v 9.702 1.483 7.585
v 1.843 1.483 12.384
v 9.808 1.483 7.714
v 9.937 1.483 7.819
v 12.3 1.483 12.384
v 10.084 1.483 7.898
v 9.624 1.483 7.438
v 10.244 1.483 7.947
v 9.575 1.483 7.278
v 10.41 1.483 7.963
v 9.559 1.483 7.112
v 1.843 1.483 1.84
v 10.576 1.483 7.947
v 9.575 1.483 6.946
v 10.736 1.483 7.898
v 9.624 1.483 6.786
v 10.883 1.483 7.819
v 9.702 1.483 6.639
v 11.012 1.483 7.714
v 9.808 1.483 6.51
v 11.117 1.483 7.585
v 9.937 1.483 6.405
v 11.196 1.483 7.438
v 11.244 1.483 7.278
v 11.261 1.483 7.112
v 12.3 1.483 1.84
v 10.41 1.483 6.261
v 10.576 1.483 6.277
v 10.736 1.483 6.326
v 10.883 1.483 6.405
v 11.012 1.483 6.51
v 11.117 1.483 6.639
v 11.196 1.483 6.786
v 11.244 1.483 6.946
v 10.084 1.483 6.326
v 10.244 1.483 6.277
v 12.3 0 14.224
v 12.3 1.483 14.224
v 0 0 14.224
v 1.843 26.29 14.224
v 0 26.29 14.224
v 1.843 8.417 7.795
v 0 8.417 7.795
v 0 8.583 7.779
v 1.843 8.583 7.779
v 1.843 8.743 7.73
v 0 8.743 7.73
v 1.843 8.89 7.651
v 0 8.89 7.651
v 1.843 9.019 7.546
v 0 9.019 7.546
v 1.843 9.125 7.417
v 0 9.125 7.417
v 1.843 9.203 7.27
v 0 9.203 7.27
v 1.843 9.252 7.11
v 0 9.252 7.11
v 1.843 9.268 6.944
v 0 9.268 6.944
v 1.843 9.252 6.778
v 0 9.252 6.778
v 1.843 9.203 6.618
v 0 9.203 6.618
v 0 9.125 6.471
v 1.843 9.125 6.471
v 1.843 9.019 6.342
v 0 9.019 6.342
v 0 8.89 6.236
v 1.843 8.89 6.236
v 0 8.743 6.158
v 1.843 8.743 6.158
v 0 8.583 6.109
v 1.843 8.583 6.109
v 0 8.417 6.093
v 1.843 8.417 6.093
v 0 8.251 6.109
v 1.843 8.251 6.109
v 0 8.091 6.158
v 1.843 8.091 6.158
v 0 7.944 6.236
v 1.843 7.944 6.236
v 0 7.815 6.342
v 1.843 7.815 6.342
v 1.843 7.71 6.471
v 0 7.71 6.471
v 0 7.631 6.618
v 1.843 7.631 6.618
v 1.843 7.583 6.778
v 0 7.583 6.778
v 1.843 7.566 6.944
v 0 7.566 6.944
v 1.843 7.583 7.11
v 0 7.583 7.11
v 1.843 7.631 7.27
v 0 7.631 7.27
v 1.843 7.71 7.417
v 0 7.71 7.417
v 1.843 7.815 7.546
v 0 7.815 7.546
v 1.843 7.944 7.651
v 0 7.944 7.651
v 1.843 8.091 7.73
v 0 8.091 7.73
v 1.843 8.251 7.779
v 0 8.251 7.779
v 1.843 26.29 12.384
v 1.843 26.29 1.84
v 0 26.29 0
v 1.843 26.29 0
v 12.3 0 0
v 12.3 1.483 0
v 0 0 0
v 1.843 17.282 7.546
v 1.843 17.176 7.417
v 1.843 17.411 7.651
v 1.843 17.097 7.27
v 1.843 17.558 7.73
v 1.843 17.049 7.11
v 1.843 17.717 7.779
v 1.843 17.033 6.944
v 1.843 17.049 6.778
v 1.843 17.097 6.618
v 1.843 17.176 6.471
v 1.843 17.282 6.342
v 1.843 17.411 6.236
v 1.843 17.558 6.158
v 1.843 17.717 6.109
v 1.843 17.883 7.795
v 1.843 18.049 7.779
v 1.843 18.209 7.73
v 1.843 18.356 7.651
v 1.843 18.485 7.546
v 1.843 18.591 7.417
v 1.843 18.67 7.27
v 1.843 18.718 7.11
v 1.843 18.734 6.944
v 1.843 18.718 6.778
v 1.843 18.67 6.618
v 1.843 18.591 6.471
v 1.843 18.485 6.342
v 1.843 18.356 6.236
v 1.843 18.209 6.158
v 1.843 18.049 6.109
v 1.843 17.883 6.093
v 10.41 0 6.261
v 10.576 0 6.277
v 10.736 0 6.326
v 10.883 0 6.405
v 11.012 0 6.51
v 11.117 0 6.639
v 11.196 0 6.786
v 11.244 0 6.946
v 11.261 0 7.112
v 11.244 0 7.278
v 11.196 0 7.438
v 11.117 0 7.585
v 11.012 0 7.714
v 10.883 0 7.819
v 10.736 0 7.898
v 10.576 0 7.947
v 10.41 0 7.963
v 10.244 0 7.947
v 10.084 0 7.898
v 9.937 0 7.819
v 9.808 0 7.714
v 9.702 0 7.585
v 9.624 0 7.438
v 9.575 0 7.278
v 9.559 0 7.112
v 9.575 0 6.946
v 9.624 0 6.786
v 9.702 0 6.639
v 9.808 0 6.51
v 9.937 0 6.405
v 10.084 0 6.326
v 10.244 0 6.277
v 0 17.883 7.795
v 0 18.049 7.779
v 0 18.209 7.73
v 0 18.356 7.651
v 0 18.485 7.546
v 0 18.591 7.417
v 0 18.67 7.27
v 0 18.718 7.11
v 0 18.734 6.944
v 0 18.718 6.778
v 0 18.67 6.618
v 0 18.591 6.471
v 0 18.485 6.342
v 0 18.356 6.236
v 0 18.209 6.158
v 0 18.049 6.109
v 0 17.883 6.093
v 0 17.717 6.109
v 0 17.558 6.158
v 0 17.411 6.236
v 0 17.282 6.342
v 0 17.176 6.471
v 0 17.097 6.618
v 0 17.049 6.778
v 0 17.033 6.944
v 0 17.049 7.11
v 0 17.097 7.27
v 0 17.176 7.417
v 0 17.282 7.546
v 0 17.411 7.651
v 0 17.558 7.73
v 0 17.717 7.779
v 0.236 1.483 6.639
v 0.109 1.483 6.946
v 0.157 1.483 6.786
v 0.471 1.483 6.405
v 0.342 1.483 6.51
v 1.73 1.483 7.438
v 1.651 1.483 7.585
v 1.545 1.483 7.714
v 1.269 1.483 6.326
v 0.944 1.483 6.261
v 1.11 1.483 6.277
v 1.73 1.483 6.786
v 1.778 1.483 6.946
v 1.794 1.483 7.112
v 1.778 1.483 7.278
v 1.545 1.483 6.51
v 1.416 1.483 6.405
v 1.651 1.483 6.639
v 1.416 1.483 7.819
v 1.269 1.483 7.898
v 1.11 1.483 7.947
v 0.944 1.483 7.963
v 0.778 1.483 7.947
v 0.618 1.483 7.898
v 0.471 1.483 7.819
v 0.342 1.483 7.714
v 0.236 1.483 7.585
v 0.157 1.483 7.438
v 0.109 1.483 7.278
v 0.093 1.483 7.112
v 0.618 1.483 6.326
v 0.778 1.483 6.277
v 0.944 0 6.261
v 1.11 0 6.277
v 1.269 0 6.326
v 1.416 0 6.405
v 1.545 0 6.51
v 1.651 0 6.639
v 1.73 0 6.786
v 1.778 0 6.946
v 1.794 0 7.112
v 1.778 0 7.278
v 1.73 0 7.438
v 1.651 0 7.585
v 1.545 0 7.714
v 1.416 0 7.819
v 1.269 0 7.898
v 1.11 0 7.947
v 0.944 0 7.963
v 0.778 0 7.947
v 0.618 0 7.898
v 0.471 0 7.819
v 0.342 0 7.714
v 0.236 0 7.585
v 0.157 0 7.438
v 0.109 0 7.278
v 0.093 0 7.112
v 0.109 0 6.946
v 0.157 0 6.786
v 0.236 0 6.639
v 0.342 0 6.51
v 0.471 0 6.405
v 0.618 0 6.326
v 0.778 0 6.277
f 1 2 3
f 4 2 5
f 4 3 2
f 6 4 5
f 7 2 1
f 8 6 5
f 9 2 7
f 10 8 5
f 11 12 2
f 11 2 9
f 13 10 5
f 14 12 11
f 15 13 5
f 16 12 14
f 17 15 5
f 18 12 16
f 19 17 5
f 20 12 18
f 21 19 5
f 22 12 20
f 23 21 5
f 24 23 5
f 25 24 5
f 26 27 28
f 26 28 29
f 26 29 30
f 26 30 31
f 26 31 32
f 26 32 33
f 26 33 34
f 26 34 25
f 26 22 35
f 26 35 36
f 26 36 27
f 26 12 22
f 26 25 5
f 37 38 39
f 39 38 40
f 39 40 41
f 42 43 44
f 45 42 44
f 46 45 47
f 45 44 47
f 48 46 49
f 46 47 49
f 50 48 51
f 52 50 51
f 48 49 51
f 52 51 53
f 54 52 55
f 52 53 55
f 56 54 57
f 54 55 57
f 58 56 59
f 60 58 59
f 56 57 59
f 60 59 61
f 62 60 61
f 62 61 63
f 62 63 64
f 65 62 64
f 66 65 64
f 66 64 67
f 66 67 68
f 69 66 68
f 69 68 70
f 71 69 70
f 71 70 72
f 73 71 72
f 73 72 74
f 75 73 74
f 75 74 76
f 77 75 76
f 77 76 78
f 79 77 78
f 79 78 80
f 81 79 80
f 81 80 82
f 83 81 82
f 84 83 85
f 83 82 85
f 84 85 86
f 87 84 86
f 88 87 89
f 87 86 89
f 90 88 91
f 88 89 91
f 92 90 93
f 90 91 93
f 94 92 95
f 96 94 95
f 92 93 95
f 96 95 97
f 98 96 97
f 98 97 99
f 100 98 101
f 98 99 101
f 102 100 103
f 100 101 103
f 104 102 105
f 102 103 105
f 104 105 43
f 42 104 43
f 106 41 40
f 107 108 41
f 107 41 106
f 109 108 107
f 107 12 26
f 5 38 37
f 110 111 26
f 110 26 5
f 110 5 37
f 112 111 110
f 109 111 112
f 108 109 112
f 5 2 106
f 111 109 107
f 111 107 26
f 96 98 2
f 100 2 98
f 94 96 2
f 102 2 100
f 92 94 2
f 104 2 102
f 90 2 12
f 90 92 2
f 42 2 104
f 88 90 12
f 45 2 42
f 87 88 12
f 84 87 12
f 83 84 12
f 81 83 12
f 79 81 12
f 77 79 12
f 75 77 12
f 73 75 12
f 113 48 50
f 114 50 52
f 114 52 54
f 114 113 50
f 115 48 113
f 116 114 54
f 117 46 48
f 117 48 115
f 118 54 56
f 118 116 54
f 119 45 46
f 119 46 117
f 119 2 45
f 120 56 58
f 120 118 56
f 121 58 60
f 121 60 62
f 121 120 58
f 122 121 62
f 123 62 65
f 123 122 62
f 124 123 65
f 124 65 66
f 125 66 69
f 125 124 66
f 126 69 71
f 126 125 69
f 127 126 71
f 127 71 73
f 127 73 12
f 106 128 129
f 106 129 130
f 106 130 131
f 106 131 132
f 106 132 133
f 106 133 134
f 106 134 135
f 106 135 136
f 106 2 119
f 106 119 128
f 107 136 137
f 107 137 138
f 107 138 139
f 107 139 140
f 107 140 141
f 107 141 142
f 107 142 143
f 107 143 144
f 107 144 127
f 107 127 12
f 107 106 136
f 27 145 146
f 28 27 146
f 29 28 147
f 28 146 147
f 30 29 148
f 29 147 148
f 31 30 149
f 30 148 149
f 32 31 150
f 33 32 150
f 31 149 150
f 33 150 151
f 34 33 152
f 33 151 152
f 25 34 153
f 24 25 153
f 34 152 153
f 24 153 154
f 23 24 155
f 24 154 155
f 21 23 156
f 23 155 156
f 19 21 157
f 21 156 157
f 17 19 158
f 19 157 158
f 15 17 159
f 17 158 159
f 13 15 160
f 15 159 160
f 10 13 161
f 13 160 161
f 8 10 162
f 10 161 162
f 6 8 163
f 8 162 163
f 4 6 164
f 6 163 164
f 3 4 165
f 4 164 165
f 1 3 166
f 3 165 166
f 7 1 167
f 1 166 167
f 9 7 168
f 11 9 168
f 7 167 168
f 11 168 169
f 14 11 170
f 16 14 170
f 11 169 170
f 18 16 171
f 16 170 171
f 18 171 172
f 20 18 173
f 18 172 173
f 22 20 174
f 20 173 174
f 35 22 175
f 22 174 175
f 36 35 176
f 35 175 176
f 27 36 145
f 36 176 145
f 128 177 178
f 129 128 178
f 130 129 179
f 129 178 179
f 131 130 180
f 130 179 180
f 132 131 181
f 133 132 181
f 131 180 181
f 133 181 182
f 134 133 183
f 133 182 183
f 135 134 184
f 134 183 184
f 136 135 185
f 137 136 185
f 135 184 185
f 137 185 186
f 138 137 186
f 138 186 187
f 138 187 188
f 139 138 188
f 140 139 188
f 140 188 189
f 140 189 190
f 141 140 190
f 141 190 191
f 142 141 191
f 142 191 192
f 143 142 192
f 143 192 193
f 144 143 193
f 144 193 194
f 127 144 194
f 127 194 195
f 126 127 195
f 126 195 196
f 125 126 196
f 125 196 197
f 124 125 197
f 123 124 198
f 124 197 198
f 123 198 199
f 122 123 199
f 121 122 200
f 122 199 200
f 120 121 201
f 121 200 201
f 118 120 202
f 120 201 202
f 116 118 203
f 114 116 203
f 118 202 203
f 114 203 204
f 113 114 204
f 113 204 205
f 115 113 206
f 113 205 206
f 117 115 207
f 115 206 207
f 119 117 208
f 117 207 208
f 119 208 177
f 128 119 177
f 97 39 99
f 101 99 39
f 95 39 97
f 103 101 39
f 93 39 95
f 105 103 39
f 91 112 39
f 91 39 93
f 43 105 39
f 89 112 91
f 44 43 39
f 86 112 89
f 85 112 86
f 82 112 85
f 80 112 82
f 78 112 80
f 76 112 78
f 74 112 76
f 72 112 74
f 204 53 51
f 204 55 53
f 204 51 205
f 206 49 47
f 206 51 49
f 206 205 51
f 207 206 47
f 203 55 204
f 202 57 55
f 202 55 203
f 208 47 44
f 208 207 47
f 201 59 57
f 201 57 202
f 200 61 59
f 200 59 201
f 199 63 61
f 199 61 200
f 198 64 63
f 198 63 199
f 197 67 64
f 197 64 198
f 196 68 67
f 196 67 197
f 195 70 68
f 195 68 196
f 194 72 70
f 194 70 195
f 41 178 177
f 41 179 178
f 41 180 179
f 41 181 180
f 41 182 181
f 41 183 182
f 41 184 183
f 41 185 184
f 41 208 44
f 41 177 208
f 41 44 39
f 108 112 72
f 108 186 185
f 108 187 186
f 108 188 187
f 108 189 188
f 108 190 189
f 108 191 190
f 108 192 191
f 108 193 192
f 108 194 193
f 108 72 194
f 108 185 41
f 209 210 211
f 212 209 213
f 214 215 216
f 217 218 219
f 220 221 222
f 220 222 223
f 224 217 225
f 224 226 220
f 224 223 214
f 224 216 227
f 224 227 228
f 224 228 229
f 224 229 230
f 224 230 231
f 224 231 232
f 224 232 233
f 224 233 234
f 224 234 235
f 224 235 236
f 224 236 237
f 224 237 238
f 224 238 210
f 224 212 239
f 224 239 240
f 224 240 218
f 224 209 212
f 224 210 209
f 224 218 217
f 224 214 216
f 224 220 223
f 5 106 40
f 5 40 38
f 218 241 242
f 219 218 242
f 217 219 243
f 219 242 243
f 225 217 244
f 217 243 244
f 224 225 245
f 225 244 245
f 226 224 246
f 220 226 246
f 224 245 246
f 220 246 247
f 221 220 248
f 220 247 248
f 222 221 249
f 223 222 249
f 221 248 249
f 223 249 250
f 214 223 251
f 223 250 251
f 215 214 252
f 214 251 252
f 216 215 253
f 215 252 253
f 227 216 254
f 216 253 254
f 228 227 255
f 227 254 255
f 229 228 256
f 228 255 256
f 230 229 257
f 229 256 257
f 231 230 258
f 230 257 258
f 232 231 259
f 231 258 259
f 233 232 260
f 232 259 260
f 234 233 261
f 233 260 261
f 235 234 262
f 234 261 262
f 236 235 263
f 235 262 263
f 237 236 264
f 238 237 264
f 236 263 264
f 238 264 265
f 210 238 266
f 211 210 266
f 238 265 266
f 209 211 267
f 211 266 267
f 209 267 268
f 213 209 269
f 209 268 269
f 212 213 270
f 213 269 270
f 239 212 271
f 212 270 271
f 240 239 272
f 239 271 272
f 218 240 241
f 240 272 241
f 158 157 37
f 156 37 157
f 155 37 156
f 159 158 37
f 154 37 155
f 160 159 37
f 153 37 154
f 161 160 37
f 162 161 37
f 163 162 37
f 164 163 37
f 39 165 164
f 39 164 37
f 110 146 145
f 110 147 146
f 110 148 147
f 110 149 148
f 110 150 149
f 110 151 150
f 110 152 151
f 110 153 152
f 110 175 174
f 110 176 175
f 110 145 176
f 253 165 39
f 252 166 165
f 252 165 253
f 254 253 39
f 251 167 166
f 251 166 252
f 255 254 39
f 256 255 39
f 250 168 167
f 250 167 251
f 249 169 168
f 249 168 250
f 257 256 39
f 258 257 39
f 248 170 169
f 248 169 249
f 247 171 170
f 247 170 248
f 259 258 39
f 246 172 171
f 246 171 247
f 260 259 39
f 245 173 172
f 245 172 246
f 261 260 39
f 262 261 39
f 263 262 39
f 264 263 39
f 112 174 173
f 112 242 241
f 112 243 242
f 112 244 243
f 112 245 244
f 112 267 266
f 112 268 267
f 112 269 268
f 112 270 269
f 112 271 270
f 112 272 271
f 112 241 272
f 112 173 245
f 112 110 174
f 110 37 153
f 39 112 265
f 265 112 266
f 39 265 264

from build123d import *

# Parameters (mm, degrees)
BOSS_EXTRUDE1_DEPTH = 14.224
SKETCH2_W           = 10.456669683
SKETCH2_H           = 10.544
CUT_EXTRUDE1_DEPTH  = 24.807321
SKETCH3_R           = 0.8509
CUT_EXTRUDE2_DEPTH  = 10
SKETCH4_R           = 0.8509
CUT_EXTRUDE3_DEPTH  = 1.482678733


with BuildPart() as part:
    # Sketch1 → Boss-Extrude1 (new body)
    with BuildSketch(Plane.XY):
        Polygon((1.843330317, 26.29), (12.3, 1.482678733), (12.3, 0), (0, 0), (0, 26.29), align=None)
    extrude(amount=BOSS_EXTRUDE1_DEPTH)

    # Sketch2 → Cut-Extrude1 (cut)
    with BuildSketch(Plane(origin=(0, 26.29, 0), x_dir=(1, 0, 0), z_dir=(0, 1, 0))):
        with Locations((7.071665159, -7.112)):
            Rectangle(SKETCH2_W, SKETCH2_H)
    extrude(amount=-CUT_EXTRUDE1_DEPTH, mode=Mode.SUBTRACT)

    # Sketch3 → Cut-Extrude2 (cut)
    with BuildSketch(Plane.ZY):
        with Locations((6.943990858, 17.883471262)):
            Circle(SKETCH3_R)
        with Locations((6.943990858, 8.417089843)):
            Circle(SKETCH3_R)
    extrude(amount=-CUT_EXTRUDE2_DEPTH, mode=Mode.SUBTRACT)

    # Sketch4 → Cut-Extrude3 (cut)
    with BuildSketch(Plane.XZ):
        with Locations(Location((10.409934908, 7.112, 0), (0, 0, 270))):
            Circle(SKETCH4_R)
        with Locations(Location((0.943553489, 7.112, 0), (0, 0, 270))):
            Circle(SKETCH4_R)
    extrude(amount=-CUT_EXTRUDE3_DEPTH, mode=Mode.SUBTRACT)


solid = part.part
